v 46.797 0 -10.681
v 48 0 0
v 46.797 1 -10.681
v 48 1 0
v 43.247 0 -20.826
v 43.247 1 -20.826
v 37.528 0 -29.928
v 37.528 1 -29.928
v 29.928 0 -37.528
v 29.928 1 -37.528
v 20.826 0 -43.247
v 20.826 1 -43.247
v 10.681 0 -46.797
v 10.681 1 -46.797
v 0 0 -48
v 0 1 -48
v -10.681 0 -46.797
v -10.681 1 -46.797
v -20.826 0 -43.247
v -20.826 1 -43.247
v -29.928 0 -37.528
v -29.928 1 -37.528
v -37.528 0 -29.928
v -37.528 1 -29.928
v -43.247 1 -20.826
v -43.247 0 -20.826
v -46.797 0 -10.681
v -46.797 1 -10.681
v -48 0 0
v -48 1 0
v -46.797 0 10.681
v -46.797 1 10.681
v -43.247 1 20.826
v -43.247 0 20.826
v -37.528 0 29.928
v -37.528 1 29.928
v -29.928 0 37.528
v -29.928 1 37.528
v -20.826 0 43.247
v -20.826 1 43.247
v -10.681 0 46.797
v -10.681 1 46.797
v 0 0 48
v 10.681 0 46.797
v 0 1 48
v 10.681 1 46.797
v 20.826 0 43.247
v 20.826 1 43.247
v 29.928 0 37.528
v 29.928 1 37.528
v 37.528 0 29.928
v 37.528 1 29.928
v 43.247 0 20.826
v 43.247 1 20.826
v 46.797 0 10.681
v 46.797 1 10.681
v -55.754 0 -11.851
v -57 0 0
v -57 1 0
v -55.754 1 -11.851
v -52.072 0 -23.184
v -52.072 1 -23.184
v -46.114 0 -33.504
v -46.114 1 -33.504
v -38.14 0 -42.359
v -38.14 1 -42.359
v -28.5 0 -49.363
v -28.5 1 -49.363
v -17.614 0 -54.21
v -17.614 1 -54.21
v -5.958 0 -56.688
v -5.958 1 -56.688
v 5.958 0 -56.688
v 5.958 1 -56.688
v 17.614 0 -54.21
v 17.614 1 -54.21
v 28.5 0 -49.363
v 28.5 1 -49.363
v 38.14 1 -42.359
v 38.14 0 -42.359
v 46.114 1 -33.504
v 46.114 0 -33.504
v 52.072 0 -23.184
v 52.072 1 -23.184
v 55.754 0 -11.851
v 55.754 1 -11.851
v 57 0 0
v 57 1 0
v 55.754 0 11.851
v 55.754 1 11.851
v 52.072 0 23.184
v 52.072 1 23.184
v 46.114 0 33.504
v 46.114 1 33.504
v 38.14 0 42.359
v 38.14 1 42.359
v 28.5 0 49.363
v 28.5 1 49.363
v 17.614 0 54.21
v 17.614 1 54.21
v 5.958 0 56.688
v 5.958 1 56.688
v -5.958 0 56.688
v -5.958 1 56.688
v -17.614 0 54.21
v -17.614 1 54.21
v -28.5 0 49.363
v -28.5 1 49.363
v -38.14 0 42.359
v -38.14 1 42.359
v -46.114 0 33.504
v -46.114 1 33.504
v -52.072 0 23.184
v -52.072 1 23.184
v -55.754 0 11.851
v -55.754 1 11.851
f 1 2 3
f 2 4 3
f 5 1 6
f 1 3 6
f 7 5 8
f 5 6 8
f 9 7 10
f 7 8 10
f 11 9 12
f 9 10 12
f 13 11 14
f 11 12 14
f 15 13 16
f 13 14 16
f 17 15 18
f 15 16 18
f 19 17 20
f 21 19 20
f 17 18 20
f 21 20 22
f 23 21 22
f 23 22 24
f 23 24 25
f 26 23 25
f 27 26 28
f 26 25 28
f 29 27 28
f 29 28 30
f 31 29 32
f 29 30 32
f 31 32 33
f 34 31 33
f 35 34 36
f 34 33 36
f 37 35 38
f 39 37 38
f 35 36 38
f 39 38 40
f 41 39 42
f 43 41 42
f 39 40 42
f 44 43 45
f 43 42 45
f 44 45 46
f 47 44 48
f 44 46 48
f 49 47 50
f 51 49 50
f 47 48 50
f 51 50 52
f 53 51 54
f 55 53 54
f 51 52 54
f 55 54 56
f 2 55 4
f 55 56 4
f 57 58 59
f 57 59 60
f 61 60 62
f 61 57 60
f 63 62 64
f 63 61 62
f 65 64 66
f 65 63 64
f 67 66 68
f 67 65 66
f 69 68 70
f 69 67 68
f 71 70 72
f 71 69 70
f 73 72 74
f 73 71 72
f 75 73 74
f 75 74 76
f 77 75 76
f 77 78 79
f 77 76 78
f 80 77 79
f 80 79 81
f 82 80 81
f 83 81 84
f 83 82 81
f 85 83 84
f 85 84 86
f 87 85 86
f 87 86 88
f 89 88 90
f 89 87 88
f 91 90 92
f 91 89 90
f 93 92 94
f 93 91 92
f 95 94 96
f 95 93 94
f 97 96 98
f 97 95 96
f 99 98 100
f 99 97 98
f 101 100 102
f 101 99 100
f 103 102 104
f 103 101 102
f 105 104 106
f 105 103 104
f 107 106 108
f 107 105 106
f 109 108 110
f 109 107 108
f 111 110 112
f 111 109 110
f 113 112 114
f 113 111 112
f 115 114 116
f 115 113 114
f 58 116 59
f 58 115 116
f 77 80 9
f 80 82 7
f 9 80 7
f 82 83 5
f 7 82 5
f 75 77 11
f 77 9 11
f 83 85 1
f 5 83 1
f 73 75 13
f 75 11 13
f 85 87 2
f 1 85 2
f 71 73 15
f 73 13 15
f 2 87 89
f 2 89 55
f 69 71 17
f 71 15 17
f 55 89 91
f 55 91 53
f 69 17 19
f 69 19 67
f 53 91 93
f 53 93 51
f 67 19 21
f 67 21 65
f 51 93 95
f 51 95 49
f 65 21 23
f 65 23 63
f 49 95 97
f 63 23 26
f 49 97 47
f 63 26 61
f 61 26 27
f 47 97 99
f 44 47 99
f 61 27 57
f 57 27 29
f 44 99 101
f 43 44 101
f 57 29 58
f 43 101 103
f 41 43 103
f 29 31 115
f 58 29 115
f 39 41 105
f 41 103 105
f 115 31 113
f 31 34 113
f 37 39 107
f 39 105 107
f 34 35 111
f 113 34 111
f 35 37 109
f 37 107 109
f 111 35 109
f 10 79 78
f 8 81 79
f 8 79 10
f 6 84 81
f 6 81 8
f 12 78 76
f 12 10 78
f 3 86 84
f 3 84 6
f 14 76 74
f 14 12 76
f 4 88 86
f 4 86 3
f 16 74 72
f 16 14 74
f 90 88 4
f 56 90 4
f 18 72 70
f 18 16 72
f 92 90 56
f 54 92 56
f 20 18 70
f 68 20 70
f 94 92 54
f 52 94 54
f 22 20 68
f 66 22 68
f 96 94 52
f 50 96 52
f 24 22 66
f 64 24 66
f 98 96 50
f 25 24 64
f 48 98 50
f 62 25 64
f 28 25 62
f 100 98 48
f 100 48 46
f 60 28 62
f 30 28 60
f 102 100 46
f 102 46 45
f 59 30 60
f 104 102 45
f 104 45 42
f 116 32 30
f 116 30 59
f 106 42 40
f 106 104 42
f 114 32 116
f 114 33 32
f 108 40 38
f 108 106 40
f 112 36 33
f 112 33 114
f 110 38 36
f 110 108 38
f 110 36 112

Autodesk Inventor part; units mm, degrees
ref_plane "YZ Plane" through (0, 0, 0) normal (1, 0, 0) x (0, 1, 0)
ref_plane "XZ Plane" through (0, 0, 0) normal (0, 1, 0) x (-1, 0, 0)
ref_plane "XY Plane" through (0, 0, 0) normal (0, 0, 1) x (1, 0, 0)
sketch "Skizze5" plane through (0, 0, 0) normal (0, 0, 1) x (1, 0, 0)
  line L0 (0, 0) -> (0, -48)
  arc A0 (-48, 0) -> (0, -48) centre (0, 0) ccw
  dimension "d17" = 48
surface revolve "Rotationsfläche3" sketch "Skizze5" angle 360 about axis through (0, 0, 0) along (0, -1, 0) shown yes curves A0 L0
sketch "Skizze6" plane through (0, 0, 0) normal (0, 0, 1) x (1, 0, 0)
  line L0 (0, 0) -> (0, -49)
  arc A0 (-49, 0) -> (0, -49) centre (0, 0) ccw
  dimension "d19" = 49
surface revolve "Rotationsfläche4" sketch "Skizze6" angle 360 about axis through (0, 0, 0) along (0, -1, 0) shown yes curves A0 L0
sketch "Skizze7" plane through (0, 0, 0) normal (0, 1, 0) x (-1, 0, 0)
  circle A0 centre (0, 0) radius 57
  dimension "d21" = 114
extrude "Extrusion1" add sketch "Skizze7" along normal blind 1
sketch "Skizze8" plane through (0, 1, 0) normal (0, 1, 0) x (1, 0, 0)
  point P0 (0, 0)
sketch "Skizze9" plane through (0, 1, 0) normal (0, 1, 0) x (1, 0, 0)
  circle A0 centre (0, 0) radius 48
extrude "Extrusion2" cut sketch "Skizze9" against normal blind 1
properties part number "Futterschüssel_innen" material "Edelstahl"
